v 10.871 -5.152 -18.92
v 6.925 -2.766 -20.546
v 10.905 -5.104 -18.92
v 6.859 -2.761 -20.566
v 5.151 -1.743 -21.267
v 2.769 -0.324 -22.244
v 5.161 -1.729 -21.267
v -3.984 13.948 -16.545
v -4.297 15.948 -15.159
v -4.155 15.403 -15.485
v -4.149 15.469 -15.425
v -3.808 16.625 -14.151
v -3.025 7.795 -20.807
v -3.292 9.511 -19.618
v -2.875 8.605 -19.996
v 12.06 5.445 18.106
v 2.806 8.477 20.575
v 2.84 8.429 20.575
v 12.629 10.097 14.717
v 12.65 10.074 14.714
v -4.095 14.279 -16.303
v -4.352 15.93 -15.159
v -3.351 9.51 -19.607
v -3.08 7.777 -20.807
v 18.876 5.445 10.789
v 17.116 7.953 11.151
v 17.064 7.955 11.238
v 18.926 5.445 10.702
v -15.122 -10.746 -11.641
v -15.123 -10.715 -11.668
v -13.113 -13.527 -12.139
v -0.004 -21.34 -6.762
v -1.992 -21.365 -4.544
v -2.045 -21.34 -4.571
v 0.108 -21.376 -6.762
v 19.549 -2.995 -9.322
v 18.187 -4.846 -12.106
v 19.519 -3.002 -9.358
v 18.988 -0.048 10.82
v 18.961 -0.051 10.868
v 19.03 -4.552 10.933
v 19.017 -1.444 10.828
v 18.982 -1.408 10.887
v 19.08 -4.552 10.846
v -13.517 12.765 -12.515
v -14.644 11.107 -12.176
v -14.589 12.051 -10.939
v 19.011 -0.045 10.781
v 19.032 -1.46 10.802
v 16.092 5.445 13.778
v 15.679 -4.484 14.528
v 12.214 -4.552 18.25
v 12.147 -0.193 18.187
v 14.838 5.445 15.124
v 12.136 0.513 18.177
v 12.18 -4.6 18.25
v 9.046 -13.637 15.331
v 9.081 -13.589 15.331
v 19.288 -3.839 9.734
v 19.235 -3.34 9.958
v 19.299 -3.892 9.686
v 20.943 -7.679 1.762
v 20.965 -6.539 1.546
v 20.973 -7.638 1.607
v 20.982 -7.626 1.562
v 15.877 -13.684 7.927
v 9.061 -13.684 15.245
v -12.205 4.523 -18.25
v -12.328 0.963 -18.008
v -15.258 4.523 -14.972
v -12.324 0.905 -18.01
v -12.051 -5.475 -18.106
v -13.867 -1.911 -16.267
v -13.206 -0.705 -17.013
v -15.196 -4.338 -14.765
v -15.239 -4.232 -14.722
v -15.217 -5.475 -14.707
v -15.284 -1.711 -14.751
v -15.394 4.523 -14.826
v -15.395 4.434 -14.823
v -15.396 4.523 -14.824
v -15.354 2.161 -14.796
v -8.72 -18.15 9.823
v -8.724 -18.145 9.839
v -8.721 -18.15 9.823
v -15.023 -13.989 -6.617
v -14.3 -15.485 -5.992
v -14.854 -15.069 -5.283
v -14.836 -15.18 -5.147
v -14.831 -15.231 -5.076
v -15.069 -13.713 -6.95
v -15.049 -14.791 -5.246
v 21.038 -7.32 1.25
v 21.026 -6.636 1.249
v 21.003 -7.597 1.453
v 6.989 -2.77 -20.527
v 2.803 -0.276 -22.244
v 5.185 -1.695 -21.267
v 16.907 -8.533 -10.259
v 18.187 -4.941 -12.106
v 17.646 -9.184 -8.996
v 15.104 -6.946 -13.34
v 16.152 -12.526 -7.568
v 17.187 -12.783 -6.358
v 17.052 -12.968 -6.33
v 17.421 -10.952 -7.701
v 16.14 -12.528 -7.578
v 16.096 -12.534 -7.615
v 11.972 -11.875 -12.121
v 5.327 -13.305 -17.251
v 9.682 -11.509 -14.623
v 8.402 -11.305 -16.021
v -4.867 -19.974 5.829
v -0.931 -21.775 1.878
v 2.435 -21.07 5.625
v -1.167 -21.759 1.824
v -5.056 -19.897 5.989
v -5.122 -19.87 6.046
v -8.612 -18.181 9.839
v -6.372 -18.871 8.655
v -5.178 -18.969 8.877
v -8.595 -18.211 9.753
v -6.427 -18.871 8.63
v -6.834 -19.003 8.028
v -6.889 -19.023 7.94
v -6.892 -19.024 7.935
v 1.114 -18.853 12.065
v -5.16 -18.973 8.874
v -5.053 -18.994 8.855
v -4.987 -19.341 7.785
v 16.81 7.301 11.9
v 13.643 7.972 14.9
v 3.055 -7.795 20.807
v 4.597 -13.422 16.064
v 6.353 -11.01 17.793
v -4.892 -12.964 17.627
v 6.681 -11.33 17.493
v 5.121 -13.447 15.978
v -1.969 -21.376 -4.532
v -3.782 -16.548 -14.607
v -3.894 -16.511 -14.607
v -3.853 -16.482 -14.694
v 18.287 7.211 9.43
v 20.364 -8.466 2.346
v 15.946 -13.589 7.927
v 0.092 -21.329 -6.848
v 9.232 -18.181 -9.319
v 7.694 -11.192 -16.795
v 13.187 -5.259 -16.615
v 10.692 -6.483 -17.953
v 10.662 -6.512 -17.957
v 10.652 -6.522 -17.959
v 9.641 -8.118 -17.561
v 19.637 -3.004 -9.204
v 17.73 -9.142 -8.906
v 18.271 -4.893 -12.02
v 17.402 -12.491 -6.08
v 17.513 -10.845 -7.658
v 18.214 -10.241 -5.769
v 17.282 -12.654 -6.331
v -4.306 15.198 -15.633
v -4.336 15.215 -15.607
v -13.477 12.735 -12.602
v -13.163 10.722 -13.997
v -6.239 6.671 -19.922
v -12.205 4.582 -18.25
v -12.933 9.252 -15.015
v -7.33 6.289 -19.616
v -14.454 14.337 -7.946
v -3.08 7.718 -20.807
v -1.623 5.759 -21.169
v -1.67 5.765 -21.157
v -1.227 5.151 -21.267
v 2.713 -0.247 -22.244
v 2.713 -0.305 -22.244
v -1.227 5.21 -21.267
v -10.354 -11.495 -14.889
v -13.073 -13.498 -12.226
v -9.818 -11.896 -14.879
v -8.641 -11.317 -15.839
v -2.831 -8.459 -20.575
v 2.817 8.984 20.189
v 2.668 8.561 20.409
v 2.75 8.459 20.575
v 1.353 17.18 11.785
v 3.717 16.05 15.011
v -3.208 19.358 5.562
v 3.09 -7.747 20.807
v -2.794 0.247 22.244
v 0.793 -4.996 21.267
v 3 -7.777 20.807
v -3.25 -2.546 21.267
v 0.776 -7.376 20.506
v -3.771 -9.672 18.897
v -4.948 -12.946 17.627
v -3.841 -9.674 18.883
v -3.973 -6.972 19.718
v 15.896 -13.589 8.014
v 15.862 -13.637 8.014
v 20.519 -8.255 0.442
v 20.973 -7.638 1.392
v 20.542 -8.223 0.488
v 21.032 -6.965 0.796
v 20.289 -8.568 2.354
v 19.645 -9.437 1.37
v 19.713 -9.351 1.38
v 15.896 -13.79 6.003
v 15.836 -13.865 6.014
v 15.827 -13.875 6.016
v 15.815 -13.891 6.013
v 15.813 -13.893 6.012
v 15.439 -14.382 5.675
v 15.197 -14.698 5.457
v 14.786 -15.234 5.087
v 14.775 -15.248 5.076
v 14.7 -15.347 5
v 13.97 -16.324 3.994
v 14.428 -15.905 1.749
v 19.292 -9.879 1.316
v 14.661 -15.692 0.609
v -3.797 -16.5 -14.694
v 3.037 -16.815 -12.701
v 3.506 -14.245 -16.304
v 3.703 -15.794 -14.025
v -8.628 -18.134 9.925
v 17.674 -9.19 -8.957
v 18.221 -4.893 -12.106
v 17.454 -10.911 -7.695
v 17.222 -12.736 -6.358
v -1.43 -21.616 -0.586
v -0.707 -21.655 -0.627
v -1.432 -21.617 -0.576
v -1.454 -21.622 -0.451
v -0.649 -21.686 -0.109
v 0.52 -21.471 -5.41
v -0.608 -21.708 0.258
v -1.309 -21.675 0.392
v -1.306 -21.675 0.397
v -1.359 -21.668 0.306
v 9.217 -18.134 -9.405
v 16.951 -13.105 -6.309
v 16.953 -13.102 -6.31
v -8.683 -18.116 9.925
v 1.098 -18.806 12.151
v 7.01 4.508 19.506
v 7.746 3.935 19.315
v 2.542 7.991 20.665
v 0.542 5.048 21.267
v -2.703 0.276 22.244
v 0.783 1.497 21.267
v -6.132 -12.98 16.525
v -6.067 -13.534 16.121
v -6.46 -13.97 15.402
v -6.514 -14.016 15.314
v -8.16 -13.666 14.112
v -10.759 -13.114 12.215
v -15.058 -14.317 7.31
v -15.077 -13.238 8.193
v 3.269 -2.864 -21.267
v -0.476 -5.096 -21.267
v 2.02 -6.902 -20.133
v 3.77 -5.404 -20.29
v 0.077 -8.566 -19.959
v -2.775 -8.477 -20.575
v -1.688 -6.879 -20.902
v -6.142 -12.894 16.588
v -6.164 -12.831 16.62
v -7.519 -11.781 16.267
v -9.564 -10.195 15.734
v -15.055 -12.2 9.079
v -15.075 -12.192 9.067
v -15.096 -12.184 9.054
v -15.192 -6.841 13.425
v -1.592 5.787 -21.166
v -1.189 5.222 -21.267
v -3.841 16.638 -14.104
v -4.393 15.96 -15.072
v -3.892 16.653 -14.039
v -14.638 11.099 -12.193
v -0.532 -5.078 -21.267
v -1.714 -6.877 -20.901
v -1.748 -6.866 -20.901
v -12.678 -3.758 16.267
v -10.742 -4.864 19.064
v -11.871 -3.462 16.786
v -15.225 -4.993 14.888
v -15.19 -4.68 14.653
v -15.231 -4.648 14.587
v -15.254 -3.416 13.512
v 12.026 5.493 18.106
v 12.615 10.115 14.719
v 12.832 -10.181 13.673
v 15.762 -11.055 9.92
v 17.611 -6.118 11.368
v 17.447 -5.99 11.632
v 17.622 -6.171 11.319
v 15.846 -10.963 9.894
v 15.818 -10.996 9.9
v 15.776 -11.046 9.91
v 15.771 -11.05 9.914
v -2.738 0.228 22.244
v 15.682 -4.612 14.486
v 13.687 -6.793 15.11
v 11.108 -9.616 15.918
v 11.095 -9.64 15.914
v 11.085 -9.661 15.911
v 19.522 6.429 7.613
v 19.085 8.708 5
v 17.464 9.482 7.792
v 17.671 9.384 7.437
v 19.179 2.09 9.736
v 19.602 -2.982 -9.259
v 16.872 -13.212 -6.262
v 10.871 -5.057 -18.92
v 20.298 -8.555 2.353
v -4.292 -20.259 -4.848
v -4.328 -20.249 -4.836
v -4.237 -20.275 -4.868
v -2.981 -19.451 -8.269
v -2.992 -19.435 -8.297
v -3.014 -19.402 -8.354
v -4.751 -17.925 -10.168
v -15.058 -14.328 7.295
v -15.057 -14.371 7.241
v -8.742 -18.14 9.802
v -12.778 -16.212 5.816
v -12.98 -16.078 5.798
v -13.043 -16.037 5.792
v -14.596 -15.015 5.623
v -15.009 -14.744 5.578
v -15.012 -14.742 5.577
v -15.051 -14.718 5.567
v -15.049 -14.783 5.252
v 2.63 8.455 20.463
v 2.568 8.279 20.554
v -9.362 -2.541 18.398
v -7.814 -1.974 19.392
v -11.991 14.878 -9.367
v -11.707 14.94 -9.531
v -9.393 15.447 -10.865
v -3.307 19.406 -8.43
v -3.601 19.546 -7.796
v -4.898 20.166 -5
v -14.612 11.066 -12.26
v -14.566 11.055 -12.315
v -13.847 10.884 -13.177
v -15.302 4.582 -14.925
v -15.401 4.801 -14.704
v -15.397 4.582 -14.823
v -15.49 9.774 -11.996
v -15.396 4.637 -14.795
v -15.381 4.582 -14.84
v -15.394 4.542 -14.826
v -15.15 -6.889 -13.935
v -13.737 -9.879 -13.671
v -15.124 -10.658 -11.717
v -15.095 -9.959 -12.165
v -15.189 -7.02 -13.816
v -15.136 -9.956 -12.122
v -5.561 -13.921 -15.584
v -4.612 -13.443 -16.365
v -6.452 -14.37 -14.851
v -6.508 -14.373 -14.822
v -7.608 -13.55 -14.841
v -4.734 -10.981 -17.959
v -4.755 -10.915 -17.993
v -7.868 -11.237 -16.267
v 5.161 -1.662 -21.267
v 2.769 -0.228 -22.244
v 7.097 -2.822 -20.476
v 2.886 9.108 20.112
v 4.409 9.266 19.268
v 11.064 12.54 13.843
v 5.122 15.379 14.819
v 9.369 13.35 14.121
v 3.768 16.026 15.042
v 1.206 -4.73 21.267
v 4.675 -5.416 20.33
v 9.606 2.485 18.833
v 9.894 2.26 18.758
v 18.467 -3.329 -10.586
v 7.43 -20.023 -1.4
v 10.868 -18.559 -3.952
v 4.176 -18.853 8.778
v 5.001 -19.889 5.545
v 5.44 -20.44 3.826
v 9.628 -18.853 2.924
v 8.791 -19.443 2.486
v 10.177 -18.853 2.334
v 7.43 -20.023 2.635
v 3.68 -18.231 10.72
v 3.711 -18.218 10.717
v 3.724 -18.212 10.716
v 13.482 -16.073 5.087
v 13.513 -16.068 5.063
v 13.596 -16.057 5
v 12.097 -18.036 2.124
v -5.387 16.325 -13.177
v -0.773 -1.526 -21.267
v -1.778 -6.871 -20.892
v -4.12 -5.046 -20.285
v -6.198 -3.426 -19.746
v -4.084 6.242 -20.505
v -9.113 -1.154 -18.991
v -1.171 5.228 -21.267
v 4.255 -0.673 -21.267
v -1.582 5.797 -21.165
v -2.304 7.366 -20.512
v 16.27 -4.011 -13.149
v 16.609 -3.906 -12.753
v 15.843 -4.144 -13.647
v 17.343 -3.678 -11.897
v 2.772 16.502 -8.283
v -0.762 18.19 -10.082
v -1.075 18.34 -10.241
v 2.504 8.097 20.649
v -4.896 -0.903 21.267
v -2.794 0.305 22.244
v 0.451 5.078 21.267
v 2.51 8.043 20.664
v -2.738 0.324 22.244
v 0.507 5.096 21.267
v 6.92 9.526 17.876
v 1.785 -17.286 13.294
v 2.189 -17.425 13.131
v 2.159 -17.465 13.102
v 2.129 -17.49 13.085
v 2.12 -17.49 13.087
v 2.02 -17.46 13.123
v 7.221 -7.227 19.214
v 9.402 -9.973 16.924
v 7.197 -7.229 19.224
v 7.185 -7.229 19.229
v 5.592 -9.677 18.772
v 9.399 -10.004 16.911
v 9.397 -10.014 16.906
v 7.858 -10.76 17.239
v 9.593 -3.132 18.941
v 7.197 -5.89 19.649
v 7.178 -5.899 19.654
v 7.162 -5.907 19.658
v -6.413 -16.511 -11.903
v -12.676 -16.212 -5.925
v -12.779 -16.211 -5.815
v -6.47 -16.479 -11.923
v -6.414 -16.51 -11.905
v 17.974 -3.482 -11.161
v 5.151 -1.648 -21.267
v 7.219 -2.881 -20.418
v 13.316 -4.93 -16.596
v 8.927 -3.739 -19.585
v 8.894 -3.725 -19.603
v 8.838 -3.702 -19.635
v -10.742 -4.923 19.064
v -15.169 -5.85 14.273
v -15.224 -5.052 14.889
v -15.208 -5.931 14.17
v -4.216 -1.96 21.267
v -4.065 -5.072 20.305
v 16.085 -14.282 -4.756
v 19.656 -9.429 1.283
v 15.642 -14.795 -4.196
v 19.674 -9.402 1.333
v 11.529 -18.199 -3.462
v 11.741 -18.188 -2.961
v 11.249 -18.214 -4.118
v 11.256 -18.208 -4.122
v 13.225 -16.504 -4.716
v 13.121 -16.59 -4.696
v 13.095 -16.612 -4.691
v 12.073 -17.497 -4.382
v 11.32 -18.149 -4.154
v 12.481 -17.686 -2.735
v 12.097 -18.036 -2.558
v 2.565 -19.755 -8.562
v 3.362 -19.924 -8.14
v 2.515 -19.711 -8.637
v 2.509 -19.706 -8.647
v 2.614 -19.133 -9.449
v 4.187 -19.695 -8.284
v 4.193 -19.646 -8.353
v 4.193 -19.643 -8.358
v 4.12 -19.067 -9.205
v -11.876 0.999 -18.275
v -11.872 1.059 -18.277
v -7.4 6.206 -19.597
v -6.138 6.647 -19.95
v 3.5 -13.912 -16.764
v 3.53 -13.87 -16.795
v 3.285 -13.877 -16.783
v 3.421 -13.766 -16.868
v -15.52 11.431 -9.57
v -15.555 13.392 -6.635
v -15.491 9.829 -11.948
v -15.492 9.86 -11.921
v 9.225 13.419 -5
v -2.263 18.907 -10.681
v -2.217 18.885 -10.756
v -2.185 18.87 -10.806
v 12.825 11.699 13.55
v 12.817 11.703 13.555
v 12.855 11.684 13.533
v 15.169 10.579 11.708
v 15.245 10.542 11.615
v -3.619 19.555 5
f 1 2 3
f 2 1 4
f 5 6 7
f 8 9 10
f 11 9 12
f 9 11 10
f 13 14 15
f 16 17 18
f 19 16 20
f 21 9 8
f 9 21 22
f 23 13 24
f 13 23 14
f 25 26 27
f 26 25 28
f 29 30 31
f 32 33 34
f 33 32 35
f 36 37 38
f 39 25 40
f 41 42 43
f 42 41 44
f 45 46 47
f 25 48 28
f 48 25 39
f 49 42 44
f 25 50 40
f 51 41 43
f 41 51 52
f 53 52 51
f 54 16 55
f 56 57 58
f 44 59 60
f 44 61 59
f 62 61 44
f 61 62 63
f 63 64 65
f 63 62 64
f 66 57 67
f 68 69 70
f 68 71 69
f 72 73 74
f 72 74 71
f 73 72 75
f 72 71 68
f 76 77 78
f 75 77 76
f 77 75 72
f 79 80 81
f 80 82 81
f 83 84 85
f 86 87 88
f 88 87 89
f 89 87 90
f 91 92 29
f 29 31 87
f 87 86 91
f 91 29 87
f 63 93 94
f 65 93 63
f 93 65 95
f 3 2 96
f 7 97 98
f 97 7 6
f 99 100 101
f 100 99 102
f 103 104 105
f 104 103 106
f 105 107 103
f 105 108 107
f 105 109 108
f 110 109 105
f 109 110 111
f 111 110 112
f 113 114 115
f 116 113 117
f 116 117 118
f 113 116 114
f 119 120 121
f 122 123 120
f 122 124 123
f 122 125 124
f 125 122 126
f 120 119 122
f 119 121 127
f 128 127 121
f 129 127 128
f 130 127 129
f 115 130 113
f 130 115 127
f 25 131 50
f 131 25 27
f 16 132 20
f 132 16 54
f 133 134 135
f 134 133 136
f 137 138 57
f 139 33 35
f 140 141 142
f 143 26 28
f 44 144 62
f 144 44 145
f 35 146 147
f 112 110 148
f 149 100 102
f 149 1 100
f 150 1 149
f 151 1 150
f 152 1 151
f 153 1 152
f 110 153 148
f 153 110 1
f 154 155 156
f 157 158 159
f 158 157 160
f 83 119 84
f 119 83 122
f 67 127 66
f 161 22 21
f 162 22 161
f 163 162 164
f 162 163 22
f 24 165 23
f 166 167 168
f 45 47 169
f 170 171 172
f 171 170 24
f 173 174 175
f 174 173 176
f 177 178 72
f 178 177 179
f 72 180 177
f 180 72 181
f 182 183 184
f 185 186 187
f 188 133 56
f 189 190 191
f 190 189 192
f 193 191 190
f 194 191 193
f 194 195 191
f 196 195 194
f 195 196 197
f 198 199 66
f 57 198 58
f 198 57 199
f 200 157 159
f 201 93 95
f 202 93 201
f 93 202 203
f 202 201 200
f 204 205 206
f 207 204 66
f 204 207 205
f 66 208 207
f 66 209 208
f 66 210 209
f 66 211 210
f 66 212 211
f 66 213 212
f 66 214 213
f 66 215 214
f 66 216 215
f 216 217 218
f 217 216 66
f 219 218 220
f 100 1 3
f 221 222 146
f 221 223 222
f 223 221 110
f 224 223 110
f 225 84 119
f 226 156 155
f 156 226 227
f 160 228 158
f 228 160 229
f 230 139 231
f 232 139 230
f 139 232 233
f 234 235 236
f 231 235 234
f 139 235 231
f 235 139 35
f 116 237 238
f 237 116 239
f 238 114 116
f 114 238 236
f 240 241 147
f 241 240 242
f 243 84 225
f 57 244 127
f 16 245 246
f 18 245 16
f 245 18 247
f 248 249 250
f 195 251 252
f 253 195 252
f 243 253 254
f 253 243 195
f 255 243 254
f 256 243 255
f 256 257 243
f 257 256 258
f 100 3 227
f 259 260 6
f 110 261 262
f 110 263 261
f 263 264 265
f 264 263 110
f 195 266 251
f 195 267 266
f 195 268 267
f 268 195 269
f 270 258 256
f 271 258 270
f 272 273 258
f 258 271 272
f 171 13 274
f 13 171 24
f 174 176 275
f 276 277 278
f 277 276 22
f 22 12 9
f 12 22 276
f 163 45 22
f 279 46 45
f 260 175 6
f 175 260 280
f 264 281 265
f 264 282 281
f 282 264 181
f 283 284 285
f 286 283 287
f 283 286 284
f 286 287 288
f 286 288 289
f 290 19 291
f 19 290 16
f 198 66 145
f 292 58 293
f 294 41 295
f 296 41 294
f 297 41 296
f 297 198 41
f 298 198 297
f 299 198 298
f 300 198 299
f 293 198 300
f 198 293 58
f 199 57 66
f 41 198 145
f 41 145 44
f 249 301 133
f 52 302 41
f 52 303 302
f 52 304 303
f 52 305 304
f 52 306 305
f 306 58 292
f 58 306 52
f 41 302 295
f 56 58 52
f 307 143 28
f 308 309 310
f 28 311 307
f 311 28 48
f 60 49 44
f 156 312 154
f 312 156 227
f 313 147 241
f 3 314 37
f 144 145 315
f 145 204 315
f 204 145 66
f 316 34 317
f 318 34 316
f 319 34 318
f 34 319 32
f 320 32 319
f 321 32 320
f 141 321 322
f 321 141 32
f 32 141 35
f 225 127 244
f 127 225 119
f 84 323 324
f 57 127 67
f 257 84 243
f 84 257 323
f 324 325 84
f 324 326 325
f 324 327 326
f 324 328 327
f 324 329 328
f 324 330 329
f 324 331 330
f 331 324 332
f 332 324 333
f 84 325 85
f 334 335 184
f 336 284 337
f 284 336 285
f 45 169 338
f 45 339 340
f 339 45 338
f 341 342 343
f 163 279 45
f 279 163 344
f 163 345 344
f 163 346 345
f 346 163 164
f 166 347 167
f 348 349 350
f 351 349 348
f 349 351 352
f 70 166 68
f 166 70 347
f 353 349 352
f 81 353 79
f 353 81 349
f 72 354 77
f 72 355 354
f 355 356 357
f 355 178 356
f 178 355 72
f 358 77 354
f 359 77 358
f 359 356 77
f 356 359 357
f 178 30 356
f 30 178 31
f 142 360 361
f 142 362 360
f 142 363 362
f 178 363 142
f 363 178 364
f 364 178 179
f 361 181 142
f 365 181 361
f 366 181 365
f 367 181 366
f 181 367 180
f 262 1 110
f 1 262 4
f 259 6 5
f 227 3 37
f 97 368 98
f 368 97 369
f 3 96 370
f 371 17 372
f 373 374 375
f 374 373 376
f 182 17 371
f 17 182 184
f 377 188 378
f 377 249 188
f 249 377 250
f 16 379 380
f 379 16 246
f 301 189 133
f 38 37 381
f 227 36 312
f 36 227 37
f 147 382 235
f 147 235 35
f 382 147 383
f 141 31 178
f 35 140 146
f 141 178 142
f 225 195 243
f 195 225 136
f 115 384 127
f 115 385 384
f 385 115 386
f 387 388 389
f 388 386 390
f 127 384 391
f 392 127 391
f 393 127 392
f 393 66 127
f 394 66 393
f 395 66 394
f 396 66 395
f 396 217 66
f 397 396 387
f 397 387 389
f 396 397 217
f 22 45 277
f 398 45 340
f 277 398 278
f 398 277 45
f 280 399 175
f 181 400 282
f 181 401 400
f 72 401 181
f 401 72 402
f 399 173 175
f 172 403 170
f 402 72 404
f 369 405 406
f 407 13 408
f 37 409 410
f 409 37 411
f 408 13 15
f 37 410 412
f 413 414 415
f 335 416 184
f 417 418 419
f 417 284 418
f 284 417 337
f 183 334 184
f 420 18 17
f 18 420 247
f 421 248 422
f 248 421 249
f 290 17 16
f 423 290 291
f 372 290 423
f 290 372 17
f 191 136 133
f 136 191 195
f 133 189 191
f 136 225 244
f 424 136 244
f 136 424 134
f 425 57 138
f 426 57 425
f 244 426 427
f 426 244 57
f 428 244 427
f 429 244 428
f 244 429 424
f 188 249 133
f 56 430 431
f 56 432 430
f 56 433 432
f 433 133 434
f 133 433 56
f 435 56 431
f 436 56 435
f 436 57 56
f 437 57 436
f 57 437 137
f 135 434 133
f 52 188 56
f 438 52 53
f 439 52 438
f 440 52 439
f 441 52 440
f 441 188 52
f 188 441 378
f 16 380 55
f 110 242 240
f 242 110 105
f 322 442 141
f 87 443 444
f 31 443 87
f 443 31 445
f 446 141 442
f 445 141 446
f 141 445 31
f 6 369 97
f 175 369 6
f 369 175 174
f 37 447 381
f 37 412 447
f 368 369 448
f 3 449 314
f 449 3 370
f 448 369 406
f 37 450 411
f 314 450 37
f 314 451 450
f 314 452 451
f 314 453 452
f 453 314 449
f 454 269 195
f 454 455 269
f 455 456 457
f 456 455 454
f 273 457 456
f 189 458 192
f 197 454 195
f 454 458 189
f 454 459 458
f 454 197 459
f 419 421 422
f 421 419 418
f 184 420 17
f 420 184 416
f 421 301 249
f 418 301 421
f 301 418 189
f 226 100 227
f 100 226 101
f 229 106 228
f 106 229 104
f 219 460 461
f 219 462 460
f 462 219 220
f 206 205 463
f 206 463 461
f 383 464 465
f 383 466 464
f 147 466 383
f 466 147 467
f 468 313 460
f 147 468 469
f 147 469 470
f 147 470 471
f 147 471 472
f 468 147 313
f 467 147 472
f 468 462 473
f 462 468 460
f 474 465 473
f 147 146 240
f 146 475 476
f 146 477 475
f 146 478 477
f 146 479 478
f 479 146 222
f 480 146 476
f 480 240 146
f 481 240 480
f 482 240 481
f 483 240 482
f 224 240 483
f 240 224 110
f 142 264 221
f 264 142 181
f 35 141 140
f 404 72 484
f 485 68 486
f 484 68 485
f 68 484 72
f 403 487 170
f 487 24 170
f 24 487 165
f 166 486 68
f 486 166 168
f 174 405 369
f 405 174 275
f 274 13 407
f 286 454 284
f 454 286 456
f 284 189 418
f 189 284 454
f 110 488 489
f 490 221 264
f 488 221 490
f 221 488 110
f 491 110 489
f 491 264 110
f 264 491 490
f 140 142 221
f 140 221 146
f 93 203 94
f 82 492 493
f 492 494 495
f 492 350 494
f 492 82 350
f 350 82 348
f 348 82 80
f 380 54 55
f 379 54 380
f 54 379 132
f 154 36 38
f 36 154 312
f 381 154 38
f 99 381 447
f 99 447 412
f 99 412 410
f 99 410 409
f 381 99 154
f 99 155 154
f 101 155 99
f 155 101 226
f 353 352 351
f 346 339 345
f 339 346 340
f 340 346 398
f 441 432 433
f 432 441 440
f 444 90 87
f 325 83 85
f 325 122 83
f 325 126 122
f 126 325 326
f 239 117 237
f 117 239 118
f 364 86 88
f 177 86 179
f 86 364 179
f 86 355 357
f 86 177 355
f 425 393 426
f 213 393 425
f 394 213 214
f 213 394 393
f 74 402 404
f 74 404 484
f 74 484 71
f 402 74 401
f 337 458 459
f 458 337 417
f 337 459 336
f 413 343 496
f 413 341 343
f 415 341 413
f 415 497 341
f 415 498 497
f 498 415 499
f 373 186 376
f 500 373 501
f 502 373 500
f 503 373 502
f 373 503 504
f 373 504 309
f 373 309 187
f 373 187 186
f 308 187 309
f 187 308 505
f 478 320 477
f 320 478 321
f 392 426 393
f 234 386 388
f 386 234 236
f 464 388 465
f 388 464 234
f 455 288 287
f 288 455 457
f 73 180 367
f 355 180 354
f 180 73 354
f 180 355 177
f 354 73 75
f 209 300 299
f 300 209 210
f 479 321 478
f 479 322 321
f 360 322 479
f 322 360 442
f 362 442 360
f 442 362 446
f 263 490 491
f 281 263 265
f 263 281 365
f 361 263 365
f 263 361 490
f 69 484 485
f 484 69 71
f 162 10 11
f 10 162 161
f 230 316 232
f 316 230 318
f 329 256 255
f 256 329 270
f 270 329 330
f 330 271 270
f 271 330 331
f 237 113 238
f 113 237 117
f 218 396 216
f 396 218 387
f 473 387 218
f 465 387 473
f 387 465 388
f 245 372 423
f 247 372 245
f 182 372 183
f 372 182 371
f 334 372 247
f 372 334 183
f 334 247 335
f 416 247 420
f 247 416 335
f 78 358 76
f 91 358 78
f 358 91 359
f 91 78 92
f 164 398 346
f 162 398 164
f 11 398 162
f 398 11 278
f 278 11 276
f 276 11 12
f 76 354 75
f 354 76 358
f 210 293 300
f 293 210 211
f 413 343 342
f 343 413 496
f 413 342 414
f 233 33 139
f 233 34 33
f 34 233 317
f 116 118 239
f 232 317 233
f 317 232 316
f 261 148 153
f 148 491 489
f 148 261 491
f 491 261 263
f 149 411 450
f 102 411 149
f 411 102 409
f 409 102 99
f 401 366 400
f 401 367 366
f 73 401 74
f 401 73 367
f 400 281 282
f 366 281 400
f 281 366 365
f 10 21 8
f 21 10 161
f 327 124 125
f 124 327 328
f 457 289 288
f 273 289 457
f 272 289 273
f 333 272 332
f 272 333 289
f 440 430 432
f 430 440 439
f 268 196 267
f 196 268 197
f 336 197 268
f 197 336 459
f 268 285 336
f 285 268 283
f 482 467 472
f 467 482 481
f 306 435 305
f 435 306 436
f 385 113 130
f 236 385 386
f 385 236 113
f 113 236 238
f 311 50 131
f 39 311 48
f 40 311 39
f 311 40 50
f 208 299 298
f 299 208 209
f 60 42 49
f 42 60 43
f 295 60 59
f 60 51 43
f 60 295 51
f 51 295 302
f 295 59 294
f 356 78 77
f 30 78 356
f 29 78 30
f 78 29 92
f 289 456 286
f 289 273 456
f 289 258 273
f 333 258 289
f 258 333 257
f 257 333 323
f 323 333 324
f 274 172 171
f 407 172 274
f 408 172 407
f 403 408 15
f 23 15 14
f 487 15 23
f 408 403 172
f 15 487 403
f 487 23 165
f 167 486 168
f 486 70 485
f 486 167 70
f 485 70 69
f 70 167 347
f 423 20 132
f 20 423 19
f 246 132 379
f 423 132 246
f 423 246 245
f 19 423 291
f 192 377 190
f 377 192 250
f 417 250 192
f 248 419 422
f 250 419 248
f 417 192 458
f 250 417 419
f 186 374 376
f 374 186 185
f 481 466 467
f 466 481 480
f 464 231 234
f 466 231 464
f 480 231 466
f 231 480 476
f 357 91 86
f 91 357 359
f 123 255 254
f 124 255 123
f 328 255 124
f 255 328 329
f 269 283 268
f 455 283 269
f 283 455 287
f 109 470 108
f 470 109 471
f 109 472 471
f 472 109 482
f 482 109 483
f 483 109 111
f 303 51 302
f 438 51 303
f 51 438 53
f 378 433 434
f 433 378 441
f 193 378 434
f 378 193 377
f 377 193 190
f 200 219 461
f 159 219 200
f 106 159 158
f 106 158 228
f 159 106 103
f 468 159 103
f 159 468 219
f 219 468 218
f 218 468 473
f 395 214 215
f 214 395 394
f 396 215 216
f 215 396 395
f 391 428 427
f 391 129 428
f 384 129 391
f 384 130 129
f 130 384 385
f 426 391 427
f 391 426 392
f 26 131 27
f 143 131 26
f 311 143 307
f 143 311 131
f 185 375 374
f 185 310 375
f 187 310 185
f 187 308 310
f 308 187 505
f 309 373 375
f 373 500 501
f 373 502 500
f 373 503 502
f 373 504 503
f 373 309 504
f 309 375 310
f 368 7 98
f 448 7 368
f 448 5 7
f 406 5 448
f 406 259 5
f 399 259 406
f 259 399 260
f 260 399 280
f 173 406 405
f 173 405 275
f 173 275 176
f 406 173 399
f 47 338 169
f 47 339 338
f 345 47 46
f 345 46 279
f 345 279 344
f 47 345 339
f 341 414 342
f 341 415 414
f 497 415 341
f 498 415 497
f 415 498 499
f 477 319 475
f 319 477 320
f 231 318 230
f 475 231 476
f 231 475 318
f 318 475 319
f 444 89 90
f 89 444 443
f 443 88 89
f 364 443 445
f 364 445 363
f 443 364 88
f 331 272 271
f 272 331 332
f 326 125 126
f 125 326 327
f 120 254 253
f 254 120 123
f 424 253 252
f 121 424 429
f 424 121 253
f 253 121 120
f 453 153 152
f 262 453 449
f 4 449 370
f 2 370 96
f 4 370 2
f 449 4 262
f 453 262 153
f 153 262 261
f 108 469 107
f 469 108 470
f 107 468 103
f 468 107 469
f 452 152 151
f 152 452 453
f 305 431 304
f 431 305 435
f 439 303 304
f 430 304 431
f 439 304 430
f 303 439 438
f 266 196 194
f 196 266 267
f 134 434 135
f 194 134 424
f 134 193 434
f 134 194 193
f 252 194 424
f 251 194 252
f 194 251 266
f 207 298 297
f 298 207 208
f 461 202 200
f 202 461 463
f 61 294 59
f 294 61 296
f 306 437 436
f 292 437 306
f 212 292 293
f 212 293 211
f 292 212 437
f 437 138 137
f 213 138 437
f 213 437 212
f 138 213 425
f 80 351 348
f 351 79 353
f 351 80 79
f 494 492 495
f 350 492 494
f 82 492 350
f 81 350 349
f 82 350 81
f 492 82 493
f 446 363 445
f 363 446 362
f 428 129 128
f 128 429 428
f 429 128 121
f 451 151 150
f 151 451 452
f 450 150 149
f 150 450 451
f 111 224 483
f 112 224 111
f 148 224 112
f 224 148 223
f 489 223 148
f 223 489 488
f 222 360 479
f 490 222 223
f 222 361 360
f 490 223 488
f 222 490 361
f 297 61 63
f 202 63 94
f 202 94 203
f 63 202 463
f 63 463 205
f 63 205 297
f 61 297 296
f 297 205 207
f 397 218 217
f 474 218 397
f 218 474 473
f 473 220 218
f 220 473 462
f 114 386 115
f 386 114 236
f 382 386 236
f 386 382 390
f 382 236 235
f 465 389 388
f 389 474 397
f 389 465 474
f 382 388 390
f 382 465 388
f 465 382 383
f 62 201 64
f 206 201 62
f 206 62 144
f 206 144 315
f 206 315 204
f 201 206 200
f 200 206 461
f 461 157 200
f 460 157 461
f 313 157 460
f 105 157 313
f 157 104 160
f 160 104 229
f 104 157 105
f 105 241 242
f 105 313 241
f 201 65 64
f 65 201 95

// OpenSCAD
// Auto-generated OpenSCAD file

    inner_points = 10*[[0.7057265485457351, -0.09094884907028836, -2.1180339887490542], [0.7057265485407271, -0.09094884906961656, 2.1180339887507356], [0.16480805396553816, 0.7501261667404855, -2.118033988749827], [0.16480805396053017, 0.7501261667411573, 2.118033988749963], [-0.13534846726503874, -0.6318673436504852, -2.118033988749963], [-0.13534846727004674, -0.6318673436498135, 2.118033988749827], [-0.6762669618452357, 0.20920767216028854, -2.1180339887507356], [-0.6762669618502437, 0.20920767216096034, 2.1180339887490542], [2.0666145112140093, 0.7842756603041526, -0.49999999999768924], [2.066614511212827, 0.7842756603043113, 0.5000000000023108], [-1.496236429937139, -1.5070918530244133, -0.5000000000015379], [-1.496236429938321, -1.5070918530242545, 0.4999999999984621], [1.189538758212475, -0.8432292128820578, -1.670820393248405], [1.5809510579168244, -1.4518368117400606, 0.5000000000020912], [-0.7104164554105592, 2.1110141294109295, -0.5000000000011826], [-0.7104164554117414, 2.111014129411088, 0.4999999999988174], [0.3484637424017012, -1.3841477074622546, -1.6708203932493135], [0.7398760421060506, -1.9927553063202574, 0.5000000000011826], [-1.551491471221333, 1.5700956348307327, -0.5000000000020912], [-1.5514914712225152, 1.570095634830891, 0.4999999999979088], [1.2066135049926328, -1.794132441507042, -0.36180339887328655], [0.7228012953227978, -1.0418520776948579, 1.809016994375959], [-0.6933417086273064, 1.16011090078553, -1.809016994375959], [-0.6933417086315835, 1.1601109007861032, 1.8090169943739358], [1.5362487904951605, 1.0376601608124174, -1.3090169943733039], [1.5362487904920659, 1.0376601608128326, 1.309016994376591], [-1.5067892037965744, -0.9194013377221607, -1.309016994376591], [-1.506789203799669, -0.9194013377217455, 1.3090169943733039], [2.0942420318555155, -0.7543180836233406, 2.587389943224604e-12], [-0.10772094662544573, -2.170461087577722, 2.0876308632757284e-13], [1.5533235372772314, 0.08675693218717659, -1.6180339887480804], [1.5533235372734056, 0.08675693218768951, 1.6180339887517095], [0.678099027903047, 1.447644894857364, -1.618033988749331], [0.6780990278992212, 1.4476448948578768, 1.618033988750459], [-0.6486394412037297, -1.3293860717672048, -1.618033988750459], [-0.6486394412075556, -1.3293860717666919, 1.618033988749331], [-1.5238639505779141, 0.031501890902982464, -1.6180339887517095], [-1.52386395058174, 0.03150189090349539, 1.6180339887480804], [2.08368925799608, -0.1666275683210884, -0.8090169943724658], [2.083689257994167, -0.16662756832083173, 0.8090169943774291], [-0.6380866673442945, -1.9170765870694573, -0.8090169943754059], [-0.6380866673462073, -1.9170765870692006, 0.809016994374489], [1.719904478931324, -1.0966137133903227, -0.8618033988727903], [1.5703982840554762, -0.8641462964375515, 1.309016994376933], [-0.1800507346897975, 1.857629628902408, -1.309016994375463], [-0.18005073469289257, 1.8576296289028231, 1.3090169943744319], [0.3590165162611366, -1.9718382227645073, -0.8618033988742605], [0.2095103213852889, -1.7393708058117359, 1.309016994375463], [-1.5409386973599848, 0.9824051195282235, -1.309016994376933], [-1.5409386973630799, 0.9824051195286387, 1.309016994372962]];

    outer_points = 10*[[1.2164351229694326, -0.4552393565390054, 1.81634542347101], [-1.8825899471092338, -0.5445384218729208, -1.070234075166359], [1.2010095010844373, 0.5445384218729208, 1.80197726481464], [-1.898015568994229, 0.4552393565390054, -1.0846022338227295], [1.898015568994229, -0.4552393565390054, 1.0846022338227295], [-1.2010095010844373, -0.5445384218729208, -1.80197726481464], [1.8825899471092338, 0.5445384218729208, 1.070234075166359], [-1.2164351229694326, 0.4552393565390054, -1.81634542347101], [-1.0701074495480267, -0.4893485643329636, 1.8977555181073444], [-1.8016880300626414, -0.5104292140789626, 1.2163265339716638], [1.817113651947637, -0.4893485643329636, -1.2019583753152931], [1.0855330714330222, -0.5104292140789626, -1.8833873594509738], [0.9030594368115687, -1.3588953396765044, 1.5244523891846673], [-0.6739085218196809, -2.12810364074632, 0.05558935114624375], [-0.007671924205115532, 2.12810364074632, 0.6761538385020369], [-0.7392525047197304, 2.107022991000321, -0.005275145633643785], [1.5846398828363653, -1.3588953396765044, 0.7927091995363865], [0.007671924205115532, -2.12810364074632, -0.6761538385020369], [0.6739085218196809, 2.12810364074632, -0.05558935114624375], [-0.05767205869493397, 2.107022991000321, -0.7370183352819244], [0.2986778374294102, -2.1953274817801613, 0.27820275819814366], [-1.3032493017093665, -1.34686135618262, -1.2139084489020384], [1.3032493017093665, 1.34686135618262, 1.2139084489020384], [-1.343634104101889, 1.2705908488966635, -1.2515247766201674], [-0.275339197244193, 0.02759492876997861, 2.2157379862851325], [-2.1906420225408336, -0.02759492876997861, 0.4317337448986074], [2.1906420225408336, 0.02759492876997861, -0.4317337448986074], [0.275339197244193, -0.02759492876997861, -2.2157379862851325], [-0.8642951747413561, -1.808614991745605, 0.9838565139549793], [0.920105599018874, -1.808614991745605, -0.9318720275804797], [0.3040014481556744, -0.7747280055397205, 2.072063612549453], [-2.0634430414083775, -0.842946421127637, -0.1330869019522355], [0.2790422676481473, 0.842946421127637, 2.0488154434876944], [-2.0884022219159046, 0.7747280055397205, -0.15633507101399402], [2.0884022219159046, -0.7747280055397205, 0.15633507101399402], [-0.2790422676481473, -0.842946421127637, -2.0488154434876944], [2.0634430414083775, 0.842946421127637, 0.1330869019522355], [-0.3040014481556744, 0.7747280055397205, -2.072063612549453], [-0.49076680414815965, -1.2916714986426625, 1.754081144371665], [-1.6744890489301856, -1.325780706436621, 0.6515058871208207], [1.714873851322708, -1.2916714986426625, -0.6138895594026917], [0.5311516065406822, -1.325780706436621, -1.7164648166535361], [0.1082911845077349, -1.8758388327794464, 1.2064699210068792], [-1.4841023960085102, -1.645269355437336, -0.27676127568791475], [0.3812820682730764, 1.645269355437336, 1.460746627575093], [-1.5340207570235642, 1.590079497897379, -0.3232576138114317], [1.2111115122431686, -1.8758388327794464, 0.02248456911970087], [-0.3812820682730764, -1.645269355437336, -1.460746627575093], [1.4841023960085102, 1.645269355437336, 0.27676127568791475], [-0.4312004292881303, 1.590079497897379, -1.5072429656986102]];

    // Convex hull for inner set (I)
    module inner_hull() {
        hull() {
            for (p = inner_points) {
                translate(p) sphere(r=0.1);
            }
        }
    }

    // Convex hull for outer set (O) minus inner hull (O \ I)
    module outer_minus_inner() {
        difference() {
            hull() {
                for (p = outer_points) {
                    translate(p) sphere(r=0.1);
                }
            }
            inner_hull(); // Subtract inner hull
        }
    }

    // Convex hull for outer set (O) minus all translated inner hulls
    module outer_minus_AllTranslationInner() {
        difference() {
            hull() {
                for (p = outer_points) {
                    translate(p) sphere(r=0.1);
                }
            }
            hull() {
                translate([0,0,50]) inner_hull();
                translate([0,0,-50]) inner_hull();
            }; // Subtract translated inner hulls
        }
    }

    // Difference between outer_minus_inner and outer_minus_AllTranslationInner
    module outer_minus_inner_diff() {
        difference() {
            // Outer minus inner
            difference() {
                hull() {
                    for (p = outer_points) {
                        translate(p) sphere(r=0.1);
                    }
                }
                inner_hull();
            }

            // Subtract Outer minus AllTranslationInner
            difference() {
                hull() {
                    for (p = outer_points) {
                        translate(p) sphere(r=0.1);
                    }
                }
                hull() {
                    translate([0,0,50]) inner_hull();
                    translate([0,0,-50]) inner_hull();
                };
            }
        }
    }

    // Rendering all with colors applied
    color([1, 1, 0, 1]) outer_minus_inner_diff(); // Opaque yellow
    
